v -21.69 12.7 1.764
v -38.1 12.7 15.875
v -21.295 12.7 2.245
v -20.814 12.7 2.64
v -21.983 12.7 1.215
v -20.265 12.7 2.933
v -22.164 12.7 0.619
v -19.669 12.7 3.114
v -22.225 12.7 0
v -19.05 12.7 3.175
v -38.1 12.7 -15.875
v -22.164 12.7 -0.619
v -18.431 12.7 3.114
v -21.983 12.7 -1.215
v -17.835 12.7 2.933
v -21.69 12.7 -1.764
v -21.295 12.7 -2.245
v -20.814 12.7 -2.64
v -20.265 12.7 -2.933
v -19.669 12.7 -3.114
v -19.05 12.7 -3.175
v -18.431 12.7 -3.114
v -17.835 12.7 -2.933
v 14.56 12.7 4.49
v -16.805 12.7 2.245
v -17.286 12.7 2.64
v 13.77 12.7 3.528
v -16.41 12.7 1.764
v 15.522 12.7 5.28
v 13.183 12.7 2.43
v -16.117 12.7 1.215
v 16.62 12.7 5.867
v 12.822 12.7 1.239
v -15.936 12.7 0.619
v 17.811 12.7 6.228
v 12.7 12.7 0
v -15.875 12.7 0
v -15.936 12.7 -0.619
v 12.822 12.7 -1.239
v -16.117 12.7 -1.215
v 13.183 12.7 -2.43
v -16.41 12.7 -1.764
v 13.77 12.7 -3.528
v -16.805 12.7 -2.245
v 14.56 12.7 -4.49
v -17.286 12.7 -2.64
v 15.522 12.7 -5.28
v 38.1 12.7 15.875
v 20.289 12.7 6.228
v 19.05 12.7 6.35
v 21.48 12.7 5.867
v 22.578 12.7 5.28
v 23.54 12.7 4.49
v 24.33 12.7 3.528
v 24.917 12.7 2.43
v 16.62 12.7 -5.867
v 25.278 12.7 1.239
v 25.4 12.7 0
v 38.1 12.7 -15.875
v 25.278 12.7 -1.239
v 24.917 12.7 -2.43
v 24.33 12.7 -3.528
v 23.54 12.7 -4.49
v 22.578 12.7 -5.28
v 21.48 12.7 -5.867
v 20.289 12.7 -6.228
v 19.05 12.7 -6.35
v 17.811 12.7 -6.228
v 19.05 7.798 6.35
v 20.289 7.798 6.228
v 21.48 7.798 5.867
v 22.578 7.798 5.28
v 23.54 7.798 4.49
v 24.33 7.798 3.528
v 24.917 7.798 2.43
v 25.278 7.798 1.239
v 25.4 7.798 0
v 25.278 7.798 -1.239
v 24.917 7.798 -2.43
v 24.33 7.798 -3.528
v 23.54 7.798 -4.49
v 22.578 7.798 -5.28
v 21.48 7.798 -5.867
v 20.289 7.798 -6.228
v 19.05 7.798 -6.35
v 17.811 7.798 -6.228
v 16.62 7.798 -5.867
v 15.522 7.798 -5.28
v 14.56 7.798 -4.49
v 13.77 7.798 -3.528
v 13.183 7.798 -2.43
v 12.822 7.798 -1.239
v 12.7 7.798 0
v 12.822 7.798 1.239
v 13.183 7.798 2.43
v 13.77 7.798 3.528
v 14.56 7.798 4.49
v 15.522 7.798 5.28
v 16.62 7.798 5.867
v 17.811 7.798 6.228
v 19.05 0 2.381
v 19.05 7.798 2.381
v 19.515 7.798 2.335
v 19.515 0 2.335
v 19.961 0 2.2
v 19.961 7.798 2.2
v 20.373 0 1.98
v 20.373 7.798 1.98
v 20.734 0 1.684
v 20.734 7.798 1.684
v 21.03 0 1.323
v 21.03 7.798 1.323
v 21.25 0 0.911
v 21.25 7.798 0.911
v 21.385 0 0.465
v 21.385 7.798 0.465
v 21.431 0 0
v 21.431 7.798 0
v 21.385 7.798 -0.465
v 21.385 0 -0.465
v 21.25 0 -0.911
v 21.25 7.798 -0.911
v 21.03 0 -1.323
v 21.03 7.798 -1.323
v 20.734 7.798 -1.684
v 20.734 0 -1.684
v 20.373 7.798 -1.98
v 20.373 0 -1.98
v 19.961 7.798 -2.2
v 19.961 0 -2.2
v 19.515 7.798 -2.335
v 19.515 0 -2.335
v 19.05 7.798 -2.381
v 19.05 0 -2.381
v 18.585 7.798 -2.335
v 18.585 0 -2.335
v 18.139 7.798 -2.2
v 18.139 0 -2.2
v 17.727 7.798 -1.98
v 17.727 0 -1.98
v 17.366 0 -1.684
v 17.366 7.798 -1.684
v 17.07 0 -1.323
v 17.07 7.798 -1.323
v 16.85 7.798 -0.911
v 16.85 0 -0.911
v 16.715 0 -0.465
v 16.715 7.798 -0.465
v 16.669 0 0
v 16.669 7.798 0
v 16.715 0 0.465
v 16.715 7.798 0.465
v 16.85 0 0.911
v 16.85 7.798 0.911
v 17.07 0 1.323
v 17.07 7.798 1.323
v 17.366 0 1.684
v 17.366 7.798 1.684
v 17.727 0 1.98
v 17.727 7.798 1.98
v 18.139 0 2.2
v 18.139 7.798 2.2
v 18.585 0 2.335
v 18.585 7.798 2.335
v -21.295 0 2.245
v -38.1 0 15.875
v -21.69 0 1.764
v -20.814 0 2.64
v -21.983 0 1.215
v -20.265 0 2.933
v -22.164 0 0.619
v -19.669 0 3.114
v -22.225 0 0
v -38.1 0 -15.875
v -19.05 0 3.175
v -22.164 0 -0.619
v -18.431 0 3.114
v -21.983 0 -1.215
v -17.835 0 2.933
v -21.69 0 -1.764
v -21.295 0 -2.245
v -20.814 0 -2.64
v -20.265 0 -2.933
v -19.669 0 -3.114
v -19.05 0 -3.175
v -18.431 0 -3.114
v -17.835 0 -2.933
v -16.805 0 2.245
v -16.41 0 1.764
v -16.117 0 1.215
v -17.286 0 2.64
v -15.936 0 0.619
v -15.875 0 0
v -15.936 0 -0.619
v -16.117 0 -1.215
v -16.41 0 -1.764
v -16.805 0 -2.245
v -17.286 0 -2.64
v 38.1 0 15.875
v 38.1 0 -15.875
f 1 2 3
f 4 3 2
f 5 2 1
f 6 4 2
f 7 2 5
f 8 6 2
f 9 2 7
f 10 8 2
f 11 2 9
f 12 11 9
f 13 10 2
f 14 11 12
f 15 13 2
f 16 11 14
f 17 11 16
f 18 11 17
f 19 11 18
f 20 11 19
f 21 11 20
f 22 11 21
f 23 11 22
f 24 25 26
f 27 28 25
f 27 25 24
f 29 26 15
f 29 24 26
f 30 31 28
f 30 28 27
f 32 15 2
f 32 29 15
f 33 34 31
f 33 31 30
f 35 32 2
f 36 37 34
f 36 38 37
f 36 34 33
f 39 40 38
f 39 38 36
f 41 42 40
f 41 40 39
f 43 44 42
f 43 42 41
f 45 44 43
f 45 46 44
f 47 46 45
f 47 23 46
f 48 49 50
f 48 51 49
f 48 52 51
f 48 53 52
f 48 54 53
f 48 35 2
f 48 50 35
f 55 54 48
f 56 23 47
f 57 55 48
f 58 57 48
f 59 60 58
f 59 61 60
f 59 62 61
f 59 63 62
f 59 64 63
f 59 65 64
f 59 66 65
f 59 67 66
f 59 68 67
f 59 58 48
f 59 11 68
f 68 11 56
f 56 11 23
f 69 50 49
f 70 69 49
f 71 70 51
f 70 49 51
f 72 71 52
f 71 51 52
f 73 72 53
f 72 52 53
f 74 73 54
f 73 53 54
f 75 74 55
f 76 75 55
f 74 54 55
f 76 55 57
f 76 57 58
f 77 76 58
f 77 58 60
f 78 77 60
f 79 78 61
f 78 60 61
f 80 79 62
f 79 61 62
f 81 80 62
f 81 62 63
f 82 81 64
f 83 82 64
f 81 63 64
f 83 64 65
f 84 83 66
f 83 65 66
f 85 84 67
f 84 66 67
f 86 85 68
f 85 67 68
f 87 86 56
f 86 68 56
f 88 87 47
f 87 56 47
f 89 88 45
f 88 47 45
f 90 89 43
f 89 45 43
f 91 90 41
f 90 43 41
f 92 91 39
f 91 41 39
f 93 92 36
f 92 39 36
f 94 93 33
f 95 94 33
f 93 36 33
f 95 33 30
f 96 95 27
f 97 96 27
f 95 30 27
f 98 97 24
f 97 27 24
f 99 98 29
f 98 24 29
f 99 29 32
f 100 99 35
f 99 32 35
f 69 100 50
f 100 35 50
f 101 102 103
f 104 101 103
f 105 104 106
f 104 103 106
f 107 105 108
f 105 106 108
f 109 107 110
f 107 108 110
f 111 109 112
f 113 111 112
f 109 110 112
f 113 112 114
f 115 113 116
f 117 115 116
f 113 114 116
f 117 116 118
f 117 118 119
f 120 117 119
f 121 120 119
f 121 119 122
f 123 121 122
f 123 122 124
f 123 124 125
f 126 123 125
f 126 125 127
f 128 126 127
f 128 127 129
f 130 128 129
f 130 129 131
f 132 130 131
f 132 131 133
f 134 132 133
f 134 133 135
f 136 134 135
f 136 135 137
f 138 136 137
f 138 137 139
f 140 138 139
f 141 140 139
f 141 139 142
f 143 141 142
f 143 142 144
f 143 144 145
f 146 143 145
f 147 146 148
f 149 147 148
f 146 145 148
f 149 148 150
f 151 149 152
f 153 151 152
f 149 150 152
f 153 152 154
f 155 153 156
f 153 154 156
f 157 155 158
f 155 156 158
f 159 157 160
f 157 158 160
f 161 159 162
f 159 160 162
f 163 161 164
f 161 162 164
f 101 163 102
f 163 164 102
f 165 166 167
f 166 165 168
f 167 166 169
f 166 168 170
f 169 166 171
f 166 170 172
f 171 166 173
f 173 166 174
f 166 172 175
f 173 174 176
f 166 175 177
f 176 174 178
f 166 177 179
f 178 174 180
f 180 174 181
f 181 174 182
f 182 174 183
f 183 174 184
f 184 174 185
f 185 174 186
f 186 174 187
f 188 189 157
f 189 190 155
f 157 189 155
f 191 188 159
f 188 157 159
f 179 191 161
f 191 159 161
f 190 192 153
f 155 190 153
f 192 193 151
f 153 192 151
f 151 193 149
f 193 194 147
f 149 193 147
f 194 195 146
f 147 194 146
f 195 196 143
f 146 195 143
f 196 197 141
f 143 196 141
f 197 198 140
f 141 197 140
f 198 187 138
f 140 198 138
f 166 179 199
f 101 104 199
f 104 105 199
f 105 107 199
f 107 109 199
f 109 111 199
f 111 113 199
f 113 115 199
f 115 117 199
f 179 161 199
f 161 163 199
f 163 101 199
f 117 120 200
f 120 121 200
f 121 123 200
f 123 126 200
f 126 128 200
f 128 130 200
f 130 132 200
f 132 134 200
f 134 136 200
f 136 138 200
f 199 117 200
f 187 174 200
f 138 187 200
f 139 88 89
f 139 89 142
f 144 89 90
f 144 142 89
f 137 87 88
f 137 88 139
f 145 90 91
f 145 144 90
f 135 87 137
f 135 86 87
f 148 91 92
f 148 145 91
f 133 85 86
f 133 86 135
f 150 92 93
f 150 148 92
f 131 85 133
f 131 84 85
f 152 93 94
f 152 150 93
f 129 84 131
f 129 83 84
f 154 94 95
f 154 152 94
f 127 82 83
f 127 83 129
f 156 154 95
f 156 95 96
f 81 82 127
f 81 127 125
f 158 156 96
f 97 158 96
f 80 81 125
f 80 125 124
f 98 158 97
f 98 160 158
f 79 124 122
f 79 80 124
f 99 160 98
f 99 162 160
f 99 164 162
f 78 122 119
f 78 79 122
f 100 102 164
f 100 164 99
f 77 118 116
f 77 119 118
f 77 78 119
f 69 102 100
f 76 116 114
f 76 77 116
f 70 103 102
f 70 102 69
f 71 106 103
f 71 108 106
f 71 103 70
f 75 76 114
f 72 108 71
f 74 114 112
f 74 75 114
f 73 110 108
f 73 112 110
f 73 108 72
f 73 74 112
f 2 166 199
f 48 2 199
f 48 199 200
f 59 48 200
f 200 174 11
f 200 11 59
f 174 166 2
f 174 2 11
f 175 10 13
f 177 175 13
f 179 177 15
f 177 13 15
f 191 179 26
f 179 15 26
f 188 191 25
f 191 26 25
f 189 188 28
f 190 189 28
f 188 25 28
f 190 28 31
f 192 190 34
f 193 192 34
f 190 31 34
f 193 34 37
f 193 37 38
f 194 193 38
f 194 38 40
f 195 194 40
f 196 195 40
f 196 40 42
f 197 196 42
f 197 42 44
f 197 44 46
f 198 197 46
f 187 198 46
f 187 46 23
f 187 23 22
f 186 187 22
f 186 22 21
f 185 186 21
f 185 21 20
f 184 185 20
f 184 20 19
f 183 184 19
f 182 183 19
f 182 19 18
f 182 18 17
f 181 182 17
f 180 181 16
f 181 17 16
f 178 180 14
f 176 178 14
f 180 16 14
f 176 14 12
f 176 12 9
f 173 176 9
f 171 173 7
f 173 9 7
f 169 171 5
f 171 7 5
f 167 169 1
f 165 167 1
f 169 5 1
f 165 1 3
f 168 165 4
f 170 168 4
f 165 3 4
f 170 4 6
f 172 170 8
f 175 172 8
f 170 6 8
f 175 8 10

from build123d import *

# Parameters (mm, degrees)
SKETCH1_W           = 76.2
SKETCH1_H           = 31.75
BOSS_EXTRUDE1_DEPTH = 12.7
SKETCH2_R           = 3.175
SKETCH2_R_2         = 2.38125
CUT_EXTRUDE1_DEPTH  = 44.184668865
SKETCH3_R           = 6.35
CUT_EXTRUDE2_DEPTH  = 4.9022


with BuildPart() as part:
    # Sketch1 → Boss-Extrude1 (new body)
    with BuildSketch(Plane(origin=(0, 0, 0), x_dir=(1, 0, 0), z_dir=(0, 1, 0))):
        Rectangle(SKETCH1_W, SKETCH1_H)
    extrude(amount=BOSS_EXTRUDE1_DEPTH)

    # Sketch2 → Cut-Extrude1 (cut, through all)
    with BuildSketch(Plane(origin=(0, 12.7, 0), x_dir=(1, 0, 0), z_dir=(0, 1, 0))):
        with Locations(Location((-19.05, 0, 0), (0, 0, 270))):
            Circle(SKETCH2_R)
        with Locations(Location((19.05, 0, 0), (0, 0, 270))):
            Circle(SKETCH2_R_2)
    extrude(amount=-CUT_EXTRUDE1_DEPTH, mode=Mode.SUBTRACT)

    # Sketch3 → Cut-Extrude2 (cut)
    with BuildSketch(Plane(origin=(0, 12.7, 0), x_dir=(1, 0, 0), z_dir=(0, 1, 0))):
        with Locations(Location((19.05, 0, 0), (0, 0, 270))):
            Circle(SKETCH3_R)
    extrude(amount=-CUT_EXTRUDE2_DEPTH, mode=Mode.SUBTRACT)


solid = part.part
